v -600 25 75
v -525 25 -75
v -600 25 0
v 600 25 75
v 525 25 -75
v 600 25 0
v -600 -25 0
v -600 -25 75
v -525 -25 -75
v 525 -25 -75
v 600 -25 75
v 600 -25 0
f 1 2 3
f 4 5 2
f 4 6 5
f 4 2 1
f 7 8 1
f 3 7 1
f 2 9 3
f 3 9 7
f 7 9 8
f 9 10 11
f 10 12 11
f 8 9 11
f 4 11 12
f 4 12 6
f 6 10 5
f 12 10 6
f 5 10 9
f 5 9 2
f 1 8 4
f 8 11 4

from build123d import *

# Parameters (mm, degrees)
F0_W     = 50
F0_H     = 150
F1_DEPTH = 600
F3_DEPTH = 50.001


# Not quite as in the source:
# - a pattern or mirror of a feature is missing from the dataset's text; its kind, count and spacing are read off the source's solid


with BuildPart() as f1:
    # F0 (on Right) → F1 (new body, symmetric)
    with BuildSketch(Plane.YZ):
        Rectangle(F0_W, F0_H)
    extrude(amount=F1_DEPTH, both=True)

    # F2 (on face) → F3 (cut, through all)
    with BuildSketch(Plane.XZ.offset(25)):
        Polygon((-525, -75), (-600, 0), (-600, -75), align=None)
    f3 = extrude(amount=-F3_DEPTH, mode=Mode.SUBTRACT)

    # F3_copies: F3 across plane
    add(f3.mirror(Plane(origin=(0, 0, 0), x_dir=(0, 0, 1), z_dir=(1, 0, 0))), mode=Mode.SUBTRACT)


solid = f1.part
